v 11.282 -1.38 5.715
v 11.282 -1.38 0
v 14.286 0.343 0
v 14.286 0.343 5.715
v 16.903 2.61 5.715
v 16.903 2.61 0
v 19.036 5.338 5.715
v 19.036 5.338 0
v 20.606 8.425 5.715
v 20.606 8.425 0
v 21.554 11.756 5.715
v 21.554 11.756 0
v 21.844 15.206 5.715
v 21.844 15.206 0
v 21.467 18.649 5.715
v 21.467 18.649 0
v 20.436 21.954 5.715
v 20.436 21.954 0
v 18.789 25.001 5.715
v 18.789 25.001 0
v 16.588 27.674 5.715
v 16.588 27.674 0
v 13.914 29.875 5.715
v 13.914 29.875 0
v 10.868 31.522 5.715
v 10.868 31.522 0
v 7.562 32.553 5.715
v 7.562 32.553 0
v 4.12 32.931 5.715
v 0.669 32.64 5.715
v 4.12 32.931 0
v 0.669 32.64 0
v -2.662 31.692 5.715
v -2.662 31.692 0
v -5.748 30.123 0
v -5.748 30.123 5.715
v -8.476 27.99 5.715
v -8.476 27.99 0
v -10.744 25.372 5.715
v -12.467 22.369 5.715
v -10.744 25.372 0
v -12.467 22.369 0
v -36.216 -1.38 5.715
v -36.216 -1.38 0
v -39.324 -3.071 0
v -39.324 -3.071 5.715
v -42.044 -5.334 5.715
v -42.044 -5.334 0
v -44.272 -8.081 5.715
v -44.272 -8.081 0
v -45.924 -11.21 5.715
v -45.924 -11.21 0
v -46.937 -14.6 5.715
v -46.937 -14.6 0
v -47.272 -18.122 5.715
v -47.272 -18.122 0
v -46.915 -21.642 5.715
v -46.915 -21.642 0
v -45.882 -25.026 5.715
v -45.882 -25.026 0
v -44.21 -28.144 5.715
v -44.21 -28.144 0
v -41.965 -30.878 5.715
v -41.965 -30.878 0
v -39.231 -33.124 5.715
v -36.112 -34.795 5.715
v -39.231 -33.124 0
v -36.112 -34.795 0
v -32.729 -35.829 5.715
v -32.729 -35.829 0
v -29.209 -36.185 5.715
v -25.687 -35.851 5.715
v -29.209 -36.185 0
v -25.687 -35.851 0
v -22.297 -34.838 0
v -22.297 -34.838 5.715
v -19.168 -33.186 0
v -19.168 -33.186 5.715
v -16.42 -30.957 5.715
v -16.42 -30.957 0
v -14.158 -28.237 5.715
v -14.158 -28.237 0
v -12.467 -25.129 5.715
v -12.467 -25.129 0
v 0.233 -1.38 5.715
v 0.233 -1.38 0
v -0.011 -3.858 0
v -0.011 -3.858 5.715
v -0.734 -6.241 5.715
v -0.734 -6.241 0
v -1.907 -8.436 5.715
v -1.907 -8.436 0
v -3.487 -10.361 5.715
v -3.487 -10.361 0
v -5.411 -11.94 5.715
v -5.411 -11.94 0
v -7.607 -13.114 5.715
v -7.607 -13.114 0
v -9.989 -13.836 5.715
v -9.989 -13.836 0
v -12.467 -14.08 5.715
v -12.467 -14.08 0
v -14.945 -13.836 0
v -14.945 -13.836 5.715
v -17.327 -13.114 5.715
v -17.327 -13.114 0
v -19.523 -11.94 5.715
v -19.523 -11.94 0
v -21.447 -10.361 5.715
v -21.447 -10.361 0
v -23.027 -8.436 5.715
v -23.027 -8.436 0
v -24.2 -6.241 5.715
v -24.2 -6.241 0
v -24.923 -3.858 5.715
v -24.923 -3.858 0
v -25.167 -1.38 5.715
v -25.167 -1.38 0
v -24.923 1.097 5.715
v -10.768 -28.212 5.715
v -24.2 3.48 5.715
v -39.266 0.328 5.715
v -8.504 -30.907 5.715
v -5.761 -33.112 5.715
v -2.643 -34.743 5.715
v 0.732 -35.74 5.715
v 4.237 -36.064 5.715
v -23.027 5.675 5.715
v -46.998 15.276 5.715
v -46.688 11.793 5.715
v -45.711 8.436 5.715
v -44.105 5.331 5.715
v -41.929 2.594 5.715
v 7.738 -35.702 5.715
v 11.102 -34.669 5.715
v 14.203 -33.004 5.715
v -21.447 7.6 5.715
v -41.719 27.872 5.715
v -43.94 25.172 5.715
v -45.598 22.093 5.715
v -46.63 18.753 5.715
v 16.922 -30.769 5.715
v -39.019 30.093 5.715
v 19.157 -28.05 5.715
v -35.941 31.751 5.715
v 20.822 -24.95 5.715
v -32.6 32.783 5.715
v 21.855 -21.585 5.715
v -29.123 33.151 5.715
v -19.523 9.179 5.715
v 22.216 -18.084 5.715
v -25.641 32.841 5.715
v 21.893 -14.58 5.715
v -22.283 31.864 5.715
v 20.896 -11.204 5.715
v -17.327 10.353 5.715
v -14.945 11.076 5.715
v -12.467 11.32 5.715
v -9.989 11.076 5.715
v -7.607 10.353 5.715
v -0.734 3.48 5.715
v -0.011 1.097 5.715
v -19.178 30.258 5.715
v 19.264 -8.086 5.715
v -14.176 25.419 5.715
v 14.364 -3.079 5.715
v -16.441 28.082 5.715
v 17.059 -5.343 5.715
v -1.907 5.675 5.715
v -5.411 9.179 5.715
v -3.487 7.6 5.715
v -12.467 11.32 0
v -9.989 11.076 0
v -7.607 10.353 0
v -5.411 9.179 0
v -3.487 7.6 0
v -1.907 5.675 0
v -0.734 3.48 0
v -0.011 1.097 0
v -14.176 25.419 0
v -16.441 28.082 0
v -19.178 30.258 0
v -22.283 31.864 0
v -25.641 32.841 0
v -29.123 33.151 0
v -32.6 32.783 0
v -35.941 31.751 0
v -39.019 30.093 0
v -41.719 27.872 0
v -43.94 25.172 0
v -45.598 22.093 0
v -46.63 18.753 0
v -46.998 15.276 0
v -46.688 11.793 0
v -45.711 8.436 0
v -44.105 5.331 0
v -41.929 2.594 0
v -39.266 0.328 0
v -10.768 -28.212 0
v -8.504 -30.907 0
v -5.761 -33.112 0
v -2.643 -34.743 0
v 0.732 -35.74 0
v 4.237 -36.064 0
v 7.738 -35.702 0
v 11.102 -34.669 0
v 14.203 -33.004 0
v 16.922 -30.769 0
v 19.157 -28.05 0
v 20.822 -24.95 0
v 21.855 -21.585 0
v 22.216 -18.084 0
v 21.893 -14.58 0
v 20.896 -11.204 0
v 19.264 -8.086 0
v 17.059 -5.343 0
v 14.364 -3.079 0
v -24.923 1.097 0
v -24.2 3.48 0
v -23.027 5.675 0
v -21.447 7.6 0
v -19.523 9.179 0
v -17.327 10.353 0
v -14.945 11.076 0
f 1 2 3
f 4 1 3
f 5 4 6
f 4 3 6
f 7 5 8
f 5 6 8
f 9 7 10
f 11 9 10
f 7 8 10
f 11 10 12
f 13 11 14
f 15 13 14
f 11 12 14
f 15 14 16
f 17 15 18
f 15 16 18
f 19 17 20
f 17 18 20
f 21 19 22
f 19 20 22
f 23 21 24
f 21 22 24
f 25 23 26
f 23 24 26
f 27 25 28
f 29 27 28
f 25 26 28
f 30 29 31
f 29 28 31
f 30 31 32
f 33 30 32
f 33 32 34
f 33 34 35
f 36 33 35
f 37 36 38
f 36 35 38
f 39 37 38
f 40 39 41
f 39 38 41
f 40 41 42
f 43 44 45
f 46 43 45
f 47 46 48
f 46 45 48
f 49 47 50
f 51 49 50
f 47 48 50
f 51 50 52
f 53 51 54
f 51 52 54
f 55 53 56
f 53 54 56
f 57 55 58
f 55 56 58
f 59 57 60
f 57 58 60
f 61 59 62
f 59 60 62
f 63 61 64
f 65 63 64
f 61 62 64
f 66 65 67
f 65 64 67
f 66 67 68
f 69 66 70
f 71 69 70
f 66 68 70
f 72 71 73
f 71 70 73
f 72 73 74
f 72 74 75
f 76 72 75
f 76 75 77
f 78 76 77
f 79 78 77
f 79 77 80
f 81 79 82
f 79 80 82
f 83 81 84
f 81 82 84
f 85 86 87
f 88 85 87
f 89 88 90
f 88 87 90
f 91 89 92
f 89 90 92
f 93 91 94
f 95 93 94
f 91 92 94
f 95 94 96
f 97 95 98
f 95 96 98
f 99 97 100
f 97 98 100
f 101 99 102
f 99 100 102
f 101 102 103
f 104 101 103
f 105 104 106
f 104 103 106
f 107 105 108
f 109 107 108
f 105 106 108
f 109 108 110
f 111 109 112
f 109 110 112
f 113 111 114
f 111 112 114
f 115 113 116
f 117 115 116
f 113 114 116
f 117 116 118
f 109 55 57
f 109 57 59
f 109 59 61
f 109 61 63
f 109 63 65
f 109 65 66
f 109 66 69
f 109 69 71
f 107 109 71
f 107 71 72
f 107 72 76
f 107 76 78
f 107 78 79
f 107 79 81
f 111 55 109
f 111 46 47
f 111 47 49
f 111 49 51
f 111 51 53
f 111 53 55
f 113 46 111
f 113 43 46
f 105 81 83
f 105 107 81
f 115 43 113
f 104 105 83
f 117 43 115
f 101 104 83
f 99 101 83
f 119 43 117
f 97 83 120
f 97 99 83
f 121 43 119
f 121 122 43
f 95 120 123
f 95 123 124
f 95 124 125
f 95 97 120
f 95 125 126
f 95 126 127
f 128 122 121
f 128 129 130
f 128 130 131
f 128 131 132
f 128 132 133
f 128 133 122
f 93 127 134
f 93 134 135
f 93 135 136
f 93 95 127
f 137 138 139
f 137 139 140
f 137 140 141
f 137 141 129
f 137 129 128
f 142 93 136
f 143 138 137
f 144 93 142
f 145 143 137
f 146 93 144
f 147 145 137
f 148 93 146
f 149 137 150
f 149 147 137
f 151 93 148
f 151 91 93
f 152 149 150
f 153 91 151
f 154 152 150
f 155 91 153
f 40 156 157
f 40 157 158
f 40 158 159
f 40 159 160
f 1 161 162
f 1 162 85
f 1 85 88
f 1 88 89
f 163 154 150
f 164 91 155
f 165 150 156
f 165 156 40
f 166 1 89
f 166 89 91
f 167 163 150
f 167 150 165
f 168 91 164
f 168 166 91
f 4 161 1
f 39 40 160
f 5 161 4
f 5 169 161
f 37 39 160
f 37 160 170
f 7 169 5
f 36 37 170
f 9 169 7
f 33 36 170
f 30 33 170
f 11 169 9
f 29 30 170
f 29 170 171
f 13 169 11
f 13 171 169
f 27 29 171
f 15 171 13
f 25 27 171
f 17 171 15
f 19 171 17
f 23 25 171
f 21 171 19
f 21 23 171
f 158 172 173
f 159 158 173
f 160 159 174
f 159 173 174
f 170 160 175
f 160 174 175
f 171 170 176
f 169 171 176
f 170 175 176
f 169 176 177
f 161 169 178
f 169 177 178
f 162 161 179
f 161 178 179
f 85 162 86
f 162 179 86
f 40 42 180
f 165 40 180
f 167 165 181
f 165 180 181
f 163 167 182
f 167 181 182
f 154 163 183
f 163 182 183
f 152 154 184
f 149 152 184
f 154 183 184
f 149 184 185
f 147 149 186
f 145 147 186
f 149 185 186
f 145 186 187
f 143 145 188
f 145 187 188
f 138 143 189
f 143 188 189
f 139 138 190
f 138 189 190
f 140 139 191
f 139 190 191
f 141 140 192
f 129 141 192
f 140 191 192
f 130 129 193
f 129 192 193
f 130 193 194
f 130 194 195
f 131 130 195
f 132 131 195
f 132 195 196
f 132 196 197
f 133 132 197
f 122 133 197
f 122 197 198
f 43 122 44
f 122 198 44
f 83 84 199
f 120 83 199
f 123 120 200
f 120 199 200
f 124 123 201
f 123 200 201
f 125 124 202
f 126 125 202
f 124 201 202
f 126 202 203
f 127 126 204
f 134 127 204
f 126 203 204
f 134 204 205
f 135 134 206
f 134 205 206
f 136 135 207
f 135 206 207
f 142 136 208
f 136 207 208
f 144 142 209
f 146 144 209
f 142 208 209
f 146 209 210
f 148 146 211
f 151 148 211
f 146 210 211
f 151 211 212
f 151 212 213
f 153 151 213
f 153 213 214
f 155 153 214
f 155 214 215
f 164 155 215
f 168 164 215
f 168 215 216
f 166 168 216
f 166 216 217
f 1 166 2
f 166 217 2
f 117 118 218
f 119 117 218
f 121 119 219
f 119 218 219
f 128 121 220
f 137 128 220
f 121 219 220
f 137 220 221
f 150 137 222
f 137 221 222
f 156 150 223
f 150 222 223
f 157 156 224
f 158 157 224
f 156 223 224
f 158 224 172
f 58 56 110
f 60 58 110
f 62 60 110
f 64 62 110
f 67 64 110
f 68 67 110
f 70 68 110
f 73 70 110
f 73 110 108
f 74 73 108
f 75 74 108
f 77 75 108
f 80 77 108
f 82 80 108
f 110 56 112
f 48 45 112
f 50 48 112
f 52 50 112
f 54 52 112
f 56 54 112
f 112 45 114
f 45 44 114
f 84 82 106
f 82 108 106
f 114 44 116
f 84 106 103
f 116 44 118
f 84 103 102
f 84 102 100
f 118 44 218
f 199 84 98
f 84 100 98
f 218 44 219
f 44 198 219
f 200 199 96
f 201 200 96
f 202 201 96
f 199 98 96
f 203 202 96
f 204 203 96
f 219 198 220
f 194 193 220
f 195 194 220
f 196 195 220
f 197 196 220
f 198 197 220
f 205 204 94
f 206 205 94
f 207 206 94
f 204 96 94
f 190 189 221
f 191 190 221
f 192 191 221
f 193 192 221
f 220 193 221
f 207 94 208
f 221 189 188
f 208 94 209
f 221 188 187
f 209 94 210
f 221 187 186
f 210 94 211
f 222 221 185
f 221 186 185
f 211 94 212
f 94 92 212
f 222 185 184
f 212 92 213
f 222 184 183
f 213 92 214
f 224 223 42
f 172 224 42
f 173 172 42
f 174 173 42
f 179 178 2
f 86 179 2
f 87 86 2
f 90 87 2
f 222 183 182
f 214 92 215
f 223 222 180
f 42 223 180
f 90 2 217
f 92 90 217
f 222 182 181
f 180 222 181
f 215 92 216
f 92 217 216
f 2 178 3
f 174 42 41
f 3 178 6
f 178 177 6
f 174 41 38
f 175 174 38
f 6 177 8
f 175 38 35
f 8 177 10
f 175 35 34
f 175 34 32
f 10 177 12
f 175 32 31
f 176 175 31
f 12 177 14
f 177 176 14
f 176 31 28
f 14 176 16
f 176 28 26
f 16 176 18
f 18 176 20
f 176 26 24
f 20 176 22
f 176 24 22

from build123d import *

# Parameters (mm, degrees)
F1_DEPTH = 5.715


with BuildPart() as f1:
    # F0 (on Top) → F1 (new body)
    with BuildSketch(Plane.XY):
        with BuildLine():
            ThreePointArc((-12.466939, 11.319563), (-3.486683, 7.599819), (0.233061, -1.380437))
            Line((0.233061, -1.380437), (11.282061, -1.380437))
            ThreePointArc((11.282061, -1.380437), (16.587703, 27.674204), (-12.466939, 22.368563))
            Line((-12.466939, 22.368563), (-12.466939, 11.319563))
        make_face()
        with BuildLine():
            Line((11.282061, -1.380437), (0.233061, -1.380437))
            ThreePointArc((0.233061, -1.380437), (-3.486683, -10.360694), (-12.466939, -14.080437))
            Line((-12.466939, -14.080437), (-12.466939, -25.129437))
            ThreePointArc((-12.466939, -25.129437), (16.921955, -30.769331), (11.282061, -1.380437))
        make_face()
        with BuildLine():
            ThreePointArc((-25.166939, -1.380437), (-21.447195, 7.599819), (-12.466939, 11.319563))
            Line((-12.466939, 11.319563), (-12.466939, 22.368563))
            ThreePointArc((-12.466939, 22.368563), (-41.719379, 27.872003), (-36.215939, -1.380437))
            Line((-36.215939, -1.380437), (-25.166939, -1.380437))
        make_face()
        with BuildLine():
            Line((-12.466939, -25.129437), (-12.466939, -14.080437))
            ThreePointArc((-12.466939, -14.080437), (-21.447195, -10.360694), (-25.166939, -1.380437))
            Line((-25.166939, -1.380437), (-36.215939, -1.380437))
            ThreePointArc((-36.215939, -1.380437), (-41.964671, -30.87817), (-12.466939, -25.129437))
        make_face()
    extrude(amount=F1_DEPTH)


solid = f1.part
